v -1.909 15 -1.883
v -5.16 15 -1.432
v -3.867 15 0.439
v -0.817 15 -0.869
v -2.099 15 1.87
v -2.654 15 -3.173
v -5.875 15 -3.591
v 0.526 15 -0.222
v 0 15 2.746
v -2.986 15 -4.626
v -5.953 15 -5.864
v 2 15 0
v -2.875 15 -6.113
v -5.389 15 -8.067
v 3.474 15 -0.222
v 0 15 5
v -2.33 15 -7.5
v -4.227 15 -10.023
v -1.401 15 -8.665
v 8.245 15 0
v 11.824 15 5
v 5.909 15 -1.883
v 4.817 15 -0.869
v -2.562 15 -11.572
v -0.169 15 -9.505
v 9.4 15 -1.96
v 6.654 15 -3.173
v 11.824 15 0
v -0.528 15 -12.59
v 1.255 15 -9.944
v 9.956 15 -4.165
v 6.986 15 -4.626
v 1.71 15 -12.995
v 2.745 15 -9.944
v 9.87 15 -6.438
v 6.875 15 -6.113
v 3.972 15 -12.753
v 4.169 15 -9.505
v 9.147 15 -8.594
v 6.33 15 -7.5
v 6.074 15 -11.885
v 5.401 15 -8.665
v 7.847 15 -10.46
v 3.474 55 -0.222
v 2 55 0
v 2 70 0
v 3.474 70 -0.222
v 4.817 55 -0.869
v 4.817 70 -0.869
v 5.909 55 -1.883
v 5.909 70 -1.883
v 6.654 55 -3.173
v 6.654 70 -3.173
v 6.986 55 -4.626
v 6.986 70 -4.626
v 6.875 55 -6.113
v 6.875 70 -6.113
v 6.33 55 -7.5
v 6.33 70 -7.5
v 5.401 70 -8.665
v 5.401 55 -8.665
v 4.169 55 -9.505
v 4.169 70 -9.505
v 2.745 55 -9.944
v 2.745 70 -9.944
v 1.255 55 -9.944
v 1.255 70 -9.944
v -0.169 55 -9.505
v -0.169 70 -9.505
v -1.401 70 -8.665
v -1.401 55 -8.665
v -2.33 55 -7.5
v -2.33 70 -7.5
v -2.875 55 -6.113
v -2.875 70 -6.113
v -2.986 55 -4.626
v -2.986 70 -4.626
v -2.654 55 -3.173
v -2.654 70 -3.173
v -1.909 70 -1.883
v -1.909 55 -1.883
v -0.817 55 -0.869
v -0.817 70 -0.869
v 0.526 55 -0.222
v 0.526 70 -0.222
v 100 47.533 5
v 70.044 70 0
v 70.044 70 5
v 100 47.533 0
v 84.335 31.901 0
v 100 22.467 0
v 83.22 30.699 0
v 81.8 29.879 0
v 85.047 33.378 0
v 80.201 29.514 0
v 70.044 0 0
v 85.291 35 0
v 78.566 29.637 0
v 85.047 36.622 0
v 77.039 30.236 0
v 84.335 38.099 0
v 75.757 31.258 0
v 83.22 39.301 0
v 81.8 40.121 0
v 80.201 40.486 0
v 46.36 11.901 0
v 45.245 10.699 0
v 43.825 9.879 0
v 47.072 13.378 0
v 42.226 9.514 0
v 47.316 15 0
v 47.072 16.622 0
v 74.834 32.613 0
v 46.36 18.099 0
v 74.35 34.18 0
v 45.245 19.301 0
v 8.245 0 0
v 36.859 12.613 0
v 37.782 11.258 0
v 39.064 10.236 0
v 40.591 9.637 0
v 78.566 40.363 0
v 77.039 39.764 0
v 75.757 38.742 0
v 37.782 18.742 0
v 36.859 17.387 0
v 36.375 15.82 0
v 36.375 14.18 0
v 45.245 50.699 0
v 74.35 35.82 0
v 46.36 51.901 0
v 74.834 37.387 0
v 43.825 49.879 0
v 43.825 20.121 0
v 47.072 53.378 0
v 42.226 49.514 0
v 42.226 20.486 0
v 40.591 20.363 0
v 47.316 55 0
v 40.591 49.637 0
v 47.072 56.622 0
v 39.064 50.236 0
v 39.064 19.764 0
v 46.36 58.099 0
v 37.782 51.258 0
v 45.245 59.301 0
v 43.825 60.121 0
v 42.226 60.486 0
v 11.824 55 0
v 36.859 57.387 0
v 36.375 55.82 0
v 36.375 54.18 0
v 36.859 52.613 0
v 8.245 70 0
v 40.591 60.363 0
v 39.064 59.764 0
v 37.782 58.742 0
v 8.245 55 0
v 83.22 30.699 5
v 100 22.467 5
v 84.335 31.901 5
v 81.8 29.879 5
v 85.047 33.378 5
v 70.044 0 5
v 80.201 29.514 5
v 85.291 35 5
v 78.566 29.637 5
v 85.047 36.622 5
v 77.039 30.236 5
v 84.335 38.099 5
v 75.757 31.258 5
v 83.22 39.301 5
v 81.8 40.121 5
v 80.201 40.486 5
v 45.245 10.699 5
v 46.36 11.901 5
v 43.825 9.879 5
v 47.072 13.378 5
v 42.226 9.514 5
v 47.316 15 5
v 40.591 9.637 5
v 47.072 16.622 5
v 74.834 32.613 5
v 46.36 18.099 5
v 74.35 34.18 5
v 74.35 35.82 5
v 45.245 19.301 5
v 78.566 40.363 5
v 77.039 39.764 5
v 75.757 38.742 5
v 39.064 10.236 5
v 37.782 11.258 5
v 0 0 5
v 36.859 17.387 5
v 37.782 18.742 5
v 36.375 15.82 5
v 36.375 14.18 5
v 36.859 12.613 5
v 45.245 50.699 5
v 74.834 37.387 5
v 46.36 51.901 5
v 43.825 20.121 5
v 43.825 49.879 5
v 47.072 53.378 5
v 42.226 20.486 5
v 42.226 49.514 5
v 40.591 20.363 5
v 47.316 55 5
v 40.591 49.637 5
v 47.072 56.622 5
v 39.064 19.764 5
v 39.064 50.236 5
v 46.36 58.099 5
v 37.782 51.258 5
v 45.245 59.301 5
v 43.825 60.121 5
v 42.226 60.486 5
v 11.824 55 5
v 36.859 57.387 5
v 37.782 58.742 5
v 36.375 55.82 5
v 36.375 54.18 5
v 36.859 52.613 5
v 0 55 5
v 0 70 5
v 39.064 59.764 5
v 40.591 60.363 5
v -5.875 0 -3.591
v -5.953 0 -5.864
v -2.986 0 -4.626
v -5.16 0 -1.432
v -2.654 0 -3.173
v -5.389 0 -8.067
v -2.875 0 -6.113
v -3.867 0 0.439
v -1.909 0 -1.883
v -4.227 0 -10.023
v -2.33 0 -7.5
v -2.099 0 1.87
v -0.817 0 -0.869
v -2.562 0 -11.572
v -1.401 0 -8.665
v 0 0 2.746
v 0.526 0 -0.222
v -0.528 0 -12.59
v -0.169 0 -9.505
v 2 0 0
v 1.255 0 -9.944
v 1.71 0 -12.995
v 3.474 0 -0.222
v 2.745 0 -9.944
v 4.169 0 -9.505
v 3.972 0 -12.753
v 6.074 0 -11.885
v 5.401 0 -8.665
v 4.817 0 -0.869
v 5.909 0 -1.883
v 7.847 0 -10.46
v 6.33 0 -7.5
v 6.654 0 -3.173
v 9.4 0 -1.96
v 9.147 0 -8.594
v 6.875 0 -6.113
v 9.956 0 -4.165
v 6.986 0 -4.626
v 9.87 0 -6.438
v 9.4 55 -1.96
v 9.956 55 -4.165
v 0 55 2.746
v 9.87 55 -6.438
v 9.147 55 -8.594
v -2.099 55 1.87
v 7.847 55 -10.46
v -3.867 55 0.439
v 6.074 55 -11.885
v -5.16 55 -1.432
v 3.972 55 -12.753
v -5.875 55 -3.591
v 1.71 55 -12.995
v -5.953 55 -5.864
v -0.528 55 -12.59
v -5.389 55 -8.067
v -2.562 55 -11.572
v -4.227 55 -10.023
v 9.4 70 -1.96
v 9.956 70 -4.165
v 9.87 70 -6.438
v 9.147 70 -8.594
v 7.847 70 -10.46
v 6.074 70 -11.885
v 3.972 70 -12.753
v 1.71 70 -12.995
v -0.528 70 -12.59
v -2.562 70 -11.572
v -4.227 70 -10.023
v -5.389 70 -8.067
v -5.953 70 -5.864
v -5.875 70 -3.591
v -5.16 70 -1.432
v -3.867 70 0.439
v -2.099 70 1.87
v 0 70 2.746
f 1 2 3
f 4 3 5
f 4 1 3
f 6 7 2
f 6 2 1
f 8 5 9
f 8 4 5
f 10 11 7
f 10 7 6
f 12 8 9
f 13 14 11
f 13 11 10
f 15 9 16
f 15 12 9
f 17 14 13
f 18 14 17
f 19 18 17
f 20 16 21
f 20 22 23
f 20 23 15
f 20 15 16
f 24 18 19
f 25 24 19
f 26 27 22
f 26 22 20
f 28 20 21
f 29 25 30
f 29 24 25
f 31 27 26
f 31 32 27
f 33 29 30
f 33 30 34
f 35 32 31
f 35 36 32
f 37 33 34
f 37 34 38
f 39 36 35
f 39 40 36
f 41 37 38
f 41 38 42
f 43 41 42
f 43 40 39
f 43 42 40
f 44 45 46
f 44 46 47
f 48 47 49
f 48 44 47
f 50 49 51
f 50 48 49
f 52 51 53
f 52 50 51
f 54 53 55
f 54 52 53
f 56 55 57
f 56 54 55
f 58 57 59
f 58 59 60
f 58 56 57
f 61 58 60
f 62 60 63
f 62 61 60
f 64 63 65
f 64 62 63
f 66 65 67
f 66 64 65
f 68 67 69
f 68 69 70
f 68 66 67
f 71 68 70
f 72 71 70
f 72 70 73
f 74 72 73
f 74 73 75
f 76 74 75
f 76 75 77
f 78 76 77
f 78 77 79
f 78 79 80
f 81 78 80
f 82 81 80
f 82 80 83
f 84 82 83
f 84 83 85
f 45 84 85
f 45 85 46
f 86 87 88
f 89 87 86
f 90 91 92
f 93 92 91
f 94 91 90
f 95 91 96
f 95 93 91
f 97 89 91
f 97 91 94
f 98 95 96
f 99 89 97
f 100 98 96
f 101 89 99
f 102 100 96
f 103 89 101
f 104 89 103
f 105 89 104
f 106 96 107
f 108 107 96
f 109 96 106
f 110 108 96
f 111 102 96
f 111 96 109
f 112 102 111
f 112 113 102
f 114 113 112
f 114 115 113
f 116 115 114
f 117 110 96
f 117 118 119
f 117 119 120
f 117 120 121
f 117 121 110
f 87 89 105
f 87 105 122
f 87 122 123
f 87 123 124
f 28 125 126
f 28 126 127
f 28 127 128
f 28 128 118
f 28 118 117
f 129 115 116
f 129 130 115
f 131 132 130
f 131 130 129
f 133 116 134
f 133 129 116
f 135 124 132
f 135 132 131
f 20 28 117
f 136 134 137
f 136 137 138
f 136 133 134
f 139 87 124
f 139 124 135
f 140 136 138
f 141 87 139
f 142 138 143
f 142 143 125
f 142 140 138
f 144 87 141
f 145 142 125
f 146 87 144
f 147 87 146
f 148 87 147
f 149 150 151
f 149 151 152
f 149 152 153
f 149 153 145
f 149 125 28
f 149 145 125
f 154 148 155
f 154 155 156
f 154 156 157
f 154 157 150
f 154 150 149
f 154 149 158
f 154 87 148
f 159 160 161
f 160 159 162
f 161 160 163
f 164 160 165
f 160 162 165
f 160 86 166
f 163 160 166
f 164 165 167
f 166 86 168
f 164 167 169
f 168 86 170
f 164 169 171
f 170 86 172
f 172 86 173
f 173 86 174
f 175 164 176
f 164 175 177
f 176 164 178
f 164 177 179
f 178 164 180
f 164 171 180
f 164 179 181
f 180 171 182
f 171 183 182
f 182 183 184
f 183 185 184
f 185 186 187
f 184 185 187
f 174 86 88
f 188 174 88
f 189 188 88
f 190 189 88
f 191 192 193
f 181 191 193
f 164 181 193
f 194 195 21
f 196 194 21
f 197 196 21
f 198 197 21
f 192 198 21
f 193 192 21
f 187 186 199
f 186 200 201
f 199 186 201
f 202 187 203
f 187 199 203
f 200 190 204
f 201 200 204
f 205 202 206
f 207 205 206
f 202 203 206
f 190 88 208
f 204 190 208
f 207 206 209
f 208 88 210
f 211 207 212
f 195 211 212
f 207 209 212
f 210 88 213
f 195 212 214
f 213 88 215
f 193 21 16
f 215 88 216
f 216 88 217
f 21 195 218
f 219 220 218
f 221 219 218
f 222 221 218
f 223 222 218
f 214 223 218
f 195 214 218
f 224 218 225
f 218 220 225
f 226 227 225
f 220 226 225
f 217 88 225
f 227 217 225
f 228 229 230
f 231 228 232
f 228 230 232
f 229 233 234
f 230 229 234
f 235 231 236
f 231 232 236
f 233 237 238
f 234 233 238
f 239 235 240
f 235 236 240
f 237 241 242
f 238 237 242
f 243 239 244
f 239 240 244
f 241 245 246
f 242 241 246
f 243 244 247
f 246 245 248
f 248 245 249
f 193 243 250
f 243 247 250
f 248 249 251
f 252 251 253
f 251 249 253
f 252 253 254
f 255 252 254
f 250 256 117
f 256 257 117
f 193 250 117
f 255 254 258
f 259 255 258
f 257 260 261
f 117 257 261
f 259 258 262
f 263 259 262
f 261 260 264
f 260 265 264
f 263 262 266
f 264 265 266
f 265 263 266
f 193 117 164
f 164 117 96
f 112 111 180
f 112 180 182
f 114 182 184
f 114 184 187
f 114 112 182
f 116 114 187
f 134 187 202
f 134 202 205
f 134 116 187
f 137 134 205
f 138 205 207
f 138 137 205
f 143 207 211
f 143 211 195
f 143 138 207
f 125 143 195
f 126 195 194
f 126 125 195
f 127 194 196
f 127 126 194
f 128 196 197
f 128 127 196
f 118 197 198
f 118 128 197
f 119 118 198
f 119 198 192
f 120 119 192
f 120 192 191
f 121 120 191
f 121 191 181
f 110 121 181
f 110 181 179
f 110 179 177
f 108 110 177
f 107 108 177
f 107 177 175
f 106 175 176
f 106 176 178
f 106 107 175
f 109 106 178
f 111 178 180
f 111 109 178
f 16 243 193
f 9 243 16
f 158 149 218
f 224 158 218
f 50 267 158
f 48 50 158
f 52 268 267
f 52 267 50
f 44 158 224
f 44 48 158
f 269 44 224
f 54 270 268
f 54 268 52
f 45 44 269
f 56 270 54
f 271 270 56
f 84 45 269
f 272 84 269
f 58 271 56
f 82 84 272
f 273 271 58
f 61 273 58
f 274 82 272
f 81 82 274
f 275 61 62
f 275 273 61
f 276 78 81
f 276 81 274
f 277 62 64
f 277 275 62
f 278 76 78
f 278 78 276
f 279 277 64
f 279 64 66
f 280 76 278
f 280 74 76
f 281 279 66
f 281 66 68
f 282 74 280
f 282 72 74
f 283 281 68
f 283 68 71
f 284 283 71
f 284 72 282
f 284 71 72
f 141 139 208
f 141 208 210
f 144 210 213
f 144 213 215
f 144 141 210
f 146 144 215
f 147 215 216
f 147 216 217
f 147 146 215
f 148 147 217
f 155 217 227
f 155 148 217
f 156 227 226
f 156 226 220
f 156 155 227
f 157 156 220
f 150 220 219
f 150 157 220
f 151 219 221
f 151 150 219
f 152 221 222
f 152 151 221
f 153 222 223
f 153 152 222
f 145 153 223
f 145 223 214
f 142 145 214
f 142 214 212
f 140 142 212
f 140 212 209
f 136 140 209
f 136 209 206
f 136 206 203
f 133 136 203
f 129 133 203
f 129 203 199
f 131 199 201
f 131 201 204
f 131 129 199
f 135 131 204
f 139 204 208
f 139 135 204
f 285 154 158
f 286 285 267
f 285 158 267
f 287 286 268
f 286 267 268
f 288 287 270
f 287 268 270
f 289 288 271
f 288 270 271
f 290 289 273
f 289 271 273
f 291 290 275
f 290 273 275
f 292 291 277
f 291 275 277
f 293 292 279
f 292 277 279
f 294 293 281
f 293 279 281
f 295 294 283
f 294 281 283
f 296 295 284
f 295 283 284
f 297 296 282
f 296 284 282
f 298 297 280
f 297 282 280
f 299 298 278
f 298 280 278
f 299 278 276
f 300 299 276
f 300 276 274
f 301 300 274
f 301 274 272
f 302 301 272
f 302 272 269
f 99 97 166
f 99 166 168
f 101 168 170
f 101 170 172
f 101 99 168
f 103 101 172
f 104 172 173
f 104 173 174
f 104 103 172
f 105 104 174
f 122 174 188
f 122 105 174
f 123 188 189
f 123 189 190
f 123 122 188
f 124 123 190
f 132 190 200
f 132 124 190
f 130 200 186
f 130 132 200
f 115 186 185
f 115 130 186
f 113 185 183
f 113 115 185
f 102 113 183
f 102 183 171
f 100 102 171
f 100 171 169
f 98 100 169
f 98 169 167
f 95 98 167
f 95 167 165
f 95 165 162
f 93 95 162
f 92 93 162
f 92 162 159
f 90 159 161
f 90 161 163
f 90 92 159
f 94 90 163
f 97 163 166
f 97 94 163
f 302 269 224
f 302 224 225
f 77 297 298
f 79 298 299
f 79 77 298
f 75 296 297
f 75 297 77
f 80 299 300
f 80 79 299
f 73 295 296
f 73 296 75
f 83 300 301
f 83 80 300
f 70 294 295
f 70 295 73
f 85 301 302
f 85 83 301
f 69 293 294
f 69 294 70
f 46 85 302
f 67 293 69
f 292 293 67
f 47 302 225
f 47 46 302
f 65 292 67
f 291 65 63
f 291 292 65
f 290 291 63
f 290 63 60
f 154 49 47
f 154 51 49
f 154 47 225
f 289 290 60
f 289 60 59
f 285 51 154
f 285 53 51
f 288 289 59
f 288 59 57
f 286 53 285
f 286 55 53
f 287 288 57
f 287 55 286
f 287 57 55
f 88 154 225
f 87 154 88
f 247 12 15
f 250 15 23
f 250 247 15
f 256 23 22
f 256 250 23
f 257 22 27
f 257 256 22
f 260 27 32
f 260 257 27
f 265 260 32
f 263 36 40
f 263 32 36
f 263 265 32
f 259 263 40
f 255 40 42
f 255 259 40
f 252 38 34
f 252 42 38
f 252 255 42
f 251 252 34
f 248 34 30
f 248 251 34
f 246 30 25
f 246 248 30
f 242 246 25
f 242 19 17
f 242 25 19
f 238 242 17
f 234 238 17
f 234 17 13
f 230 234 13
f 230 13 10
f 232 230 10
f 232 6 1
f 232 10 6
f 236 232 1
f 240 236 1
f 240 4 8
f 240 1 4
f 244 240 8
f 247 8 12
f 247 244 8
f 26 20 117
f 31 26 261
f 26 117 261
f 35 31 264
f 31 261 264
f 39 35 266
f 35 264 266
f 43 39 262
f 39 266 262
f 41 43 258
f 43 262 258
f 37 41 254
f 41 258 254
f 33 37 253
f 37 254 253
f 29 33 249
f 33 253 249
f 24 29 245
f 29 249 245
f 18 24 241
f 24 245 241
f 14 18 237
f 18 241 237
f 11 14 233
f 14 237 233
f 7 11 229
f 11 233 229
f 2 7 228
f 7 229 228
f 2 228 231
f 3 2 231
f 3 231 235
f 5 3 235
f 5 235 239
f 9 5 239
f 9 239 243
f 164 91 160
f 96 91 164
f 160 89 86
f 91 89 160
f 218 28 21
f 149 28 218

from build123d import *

# Parameters (mm, degrees)
SKETCH1_R               = 5.501178274
BOSS_EXTRUDE1_DEPTH     = 5
SKETCH2_R               = 8
SKETCH2_R_2             = 5
BOSS_EXTRUDE2_DEPTH     = 70
CUT_EXTRUDE1_DEPTH      = 123.755855257
CUT_EXTRUDE1_DEPTH_BACK = 123.755855257
SKETCH3_W               = 17.823798536
SKETCH3_H               = 40


with BuildPart() as part:
    # Sketch1 → Boss-Extrude1 (new body)
    with BuildSketch(Plane.XY):
        Polygon((0, 0), (0, 15), (11.823798536, 15), (11.823798536, 55), (0, 55), (0, 70), (70.043570566, 70), (100, 47.532677925), (100, 22.467322075), (70.043570566, 0), align=None)
        with Locations((41.814977969, 55)):
            Circle(SKETCH1_R, mode=Mode.SUBTRACT)
        with Locations((41.814977969, 15)):
            Circle(SKETCH1_R, mode=Mode.SUBTRACT)
        with Locations((79.789963406, 35)):
            Circle(SKETCH1_R, mode=Mode.SUBTRACT)
    extrude(amount=BOSS_EXTRUDE1_DEPTH)

    # Sketch2 → Boss-Extrude2 (add)
    with BuildSketch(Plane(origin=(0, 0, 0), x_dir=(1, 0, 0), z_dir=(0, 1, 0))):
        with Locations(Location((2, 5, 0), (0, 0, 321.317812547))):
            Circle(SKETCH2_R)
        with Locations(Location((2, 5, 0), (0, 0, 270))):
            Circle(SKETCH2_R_2, mode=Mode.SUBTRACT)
    extrude(amount=BOSS_EXTRUDE2_DEPTH)

    # Sketch3 → Cut-Extrude1 (cut, two sides: drawn at the far end of the back side and taken through both)
    with BuildSketch(Plane.XY.offset(-CUT_EXTRUDE1_DEPTH_BACK)):
        with Locations((2.911899268, 35)):
            Rectangle(SKETCH3_W, SKETCH3_H)
    extrude(amount=CUT_EXTRUDE1_DEPTH + CUT_EXTRUDE1_DEPTH_BACK, mode=Mode.SUBTRACT)


solid = part.part
